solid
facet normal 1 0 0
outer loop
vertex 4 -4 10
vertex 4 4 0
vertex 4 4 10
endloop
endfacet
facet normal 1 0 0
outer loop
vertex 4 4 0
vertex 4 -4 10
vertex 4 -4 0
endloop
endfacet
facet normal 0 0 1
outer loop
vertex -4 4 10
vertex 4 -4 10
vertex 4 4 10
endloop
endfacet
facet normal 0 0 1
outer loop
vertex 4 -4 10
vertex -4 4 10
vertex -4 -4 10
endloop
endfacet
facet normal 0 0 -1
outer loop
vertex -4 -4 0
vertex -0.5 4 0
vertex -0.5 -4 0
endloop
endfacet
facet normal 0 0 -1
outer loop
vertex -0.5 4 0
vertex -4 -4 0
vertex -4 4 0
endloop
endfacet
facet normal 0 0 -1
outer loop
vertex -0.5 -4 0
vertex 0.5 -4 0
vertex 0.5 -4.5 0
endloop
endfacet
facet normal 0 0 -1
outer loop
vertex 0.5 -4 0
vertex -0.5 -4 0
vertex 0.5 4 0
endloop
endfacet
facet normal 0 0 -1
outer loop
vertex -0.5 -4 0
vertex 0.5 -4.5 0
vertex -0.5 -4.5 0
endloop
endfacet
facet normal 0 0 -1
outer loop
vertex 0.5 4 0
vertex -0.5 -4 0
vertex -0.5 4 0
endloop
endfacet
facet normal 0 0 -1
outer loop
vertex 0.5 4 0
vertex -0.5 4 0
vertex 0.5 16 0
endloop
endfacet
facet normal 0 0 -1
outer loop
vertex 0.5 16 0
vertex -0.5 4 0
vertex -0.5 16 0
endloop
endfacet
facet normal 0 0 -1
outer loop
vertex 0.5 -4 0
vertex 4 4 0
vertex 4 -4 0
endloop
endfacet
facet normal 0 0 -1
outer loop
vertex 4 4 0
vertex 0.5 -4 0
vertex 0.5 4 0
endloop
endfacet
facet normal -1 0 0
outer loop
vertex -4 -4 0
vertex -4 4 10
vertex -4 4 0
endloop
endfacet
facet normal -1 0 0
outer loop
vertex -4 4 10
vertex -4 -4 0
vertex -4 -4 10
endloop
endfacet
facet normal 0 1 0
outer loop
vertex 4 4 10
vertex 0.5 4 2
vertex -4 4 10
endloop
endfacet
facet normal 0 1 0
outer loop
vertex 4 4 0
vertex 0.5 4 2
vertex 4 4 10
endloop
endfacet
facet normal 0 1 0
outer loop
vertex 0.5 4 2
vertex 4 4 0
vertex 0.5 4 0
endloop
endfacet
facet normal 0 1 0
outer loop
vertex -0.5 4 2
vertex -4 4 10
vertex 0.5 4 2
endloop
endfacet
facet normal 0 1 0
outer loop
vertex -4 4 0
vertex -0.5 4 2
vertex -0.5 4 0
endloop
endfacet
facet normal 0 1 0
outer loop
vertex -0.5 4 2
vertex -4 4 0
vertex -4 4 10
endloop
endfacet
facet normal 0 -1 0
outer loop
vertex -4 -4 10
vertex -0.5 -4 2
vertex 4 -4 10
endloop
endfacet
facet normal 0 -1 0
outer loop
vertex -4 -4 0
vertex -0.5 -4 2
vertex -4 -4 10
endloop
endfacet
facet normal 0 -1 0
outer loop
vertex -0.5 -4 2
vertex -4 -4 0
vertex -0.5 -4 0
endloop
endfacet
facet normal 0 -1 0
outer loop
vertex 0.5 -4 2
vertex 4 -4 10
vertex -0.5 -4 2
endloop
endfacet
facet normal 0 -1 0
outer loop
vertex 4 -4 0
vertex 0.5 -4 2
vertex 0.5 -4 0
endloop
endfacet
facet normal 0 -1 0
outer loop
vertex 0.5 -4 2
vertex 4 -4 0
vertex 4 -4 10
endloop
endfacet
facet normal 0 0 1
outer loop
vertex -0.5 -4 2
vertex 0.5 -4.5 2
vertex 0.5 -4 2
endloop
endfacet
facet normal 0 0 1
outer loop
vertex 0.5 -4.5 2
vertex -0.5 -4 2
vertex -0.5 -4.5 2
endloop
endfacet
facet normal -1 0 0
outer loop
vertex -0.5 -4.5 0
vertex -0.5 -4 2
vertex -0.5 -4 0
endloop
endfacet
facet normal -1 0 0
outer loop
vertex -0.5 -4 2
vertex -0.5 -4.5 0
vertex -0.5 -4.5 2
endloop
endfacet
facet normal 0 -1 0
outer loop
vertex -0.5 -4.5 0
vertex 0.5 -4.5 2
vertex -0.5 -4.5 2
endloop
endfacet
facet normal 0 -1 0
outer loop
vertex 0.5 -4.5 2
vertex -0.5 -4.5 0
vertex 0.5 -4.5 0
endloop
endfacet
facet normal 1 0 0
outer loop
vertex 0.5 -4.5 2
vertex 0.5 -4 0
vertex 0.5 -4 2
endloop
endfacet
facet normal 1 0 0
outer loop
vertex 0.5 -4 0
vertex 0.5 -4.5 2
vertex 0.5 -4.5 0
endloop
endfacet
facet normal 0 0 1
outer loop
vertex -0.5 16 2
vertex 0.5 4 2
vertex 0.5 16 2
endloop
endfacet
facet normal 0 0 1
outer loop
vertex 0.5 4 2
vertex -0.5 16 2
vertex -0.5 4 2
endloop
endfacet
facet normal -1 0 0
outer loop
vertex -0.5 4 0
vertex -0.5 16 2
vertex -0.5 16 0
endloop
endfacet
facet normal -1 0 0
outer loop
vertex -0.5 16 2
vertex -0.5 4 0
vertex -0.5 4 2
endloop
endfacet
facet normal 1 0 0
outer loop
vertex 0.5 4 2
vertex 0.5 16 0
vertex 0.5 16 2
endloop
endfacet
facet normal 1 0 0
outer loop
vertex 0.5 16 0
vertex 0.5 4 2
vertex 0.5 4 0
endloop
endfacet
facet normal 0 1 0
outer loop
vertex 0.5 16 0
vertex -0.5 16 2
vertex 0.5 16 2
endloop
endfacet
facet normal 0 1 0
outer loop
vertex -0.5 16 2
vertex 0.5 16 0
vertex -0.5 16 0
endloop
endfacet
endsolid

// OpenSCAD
translate([0, 0, 5]) color([0,1,0,0.9]) cube([8, 8, 10], center=true);
translate([-0.25, -4.25, 1]) color([1,0,0]) cube([0.5, 0.5, 2], center=true);
translate([0.25, -4.25, 1]) color([1,0,0]) cube([0.5, 0.5, 2], center=true);
translate([-0.25, -3.75, 1]) color([1,0,0]) cube([0.5, 0.5, 2], center=true);
translate([0.25, -3.75, 1]) color([1,0,0]) cube([0.5, 0.5, 2], center=true);
translate([-0.25, -3.25, 1]) color([1,0,0]) cube([0.5, 0.5, 2], center=true);
translate([0.25, -3.25, 1]) color([1,0,0]) cube([0.5, 0.5, 2], center=true);
translate([-0.25, -2.75, 1]) color([1,0,0]) cube([0.5, 0.5, 2], center=true);
translate([0.25, -2.75, 1]) color([1,0,0]) cube([0.5, 0.5, 2], center=true);
translate([-0.25, -2.25, 1]) color([1,0,0]) cube([0.5, 0.5, 2], center=true);
translate([0.25, -2.25, 1]) color([1,0,0]) cube([0.5, 0.5, 2], center=true);
translate([-0.25, -1.75, 1]) color([1,0,0]) cube([0.5, 0.5, 2], center=true);
translate([0.25, -1.75, 1]) color([1,0,0]) cube([0.5, 0.5, 2], center=true);
translate([-0.25, -1.25, 1]) color([1,0,0]) cube([0.5, 0.5, 2], center=true);
translate([0.25, -1.25, 1]) color([1,0,0]) cube([0.5, 0.5, 2], center=true);
translate([-0.25, -0.75, 1]) color([1,0,0]) cube([0.5, 0.5, 2], center=true);
translate([0.25, -0.75, 1]) color([1,0,0]) cube([0.5, 0.5, 2], center=true);
translate([-0.25, -0.25, 1]) color([1,0,0]) cube([0.5, 0.5, 2], center=true);
translate([0.25, -0.25, 1]) color([1,0,0]) cube([0.5, 0.5, 2], center=true);
translate([-0.25, 0.25, 1]) color([1,0,0]) cube([0.5, 0.5, 2], center=true);
translate([0.25, 0.25, 1]) color([1,0,0]) cube([0.5, 0.5, 2], center=true);
translate([-0.25, 0.75, 1]) color([1,0,0]) cube([0.5, 0.5, 2], center=true);
translate([0.25, 0.75, 1]) color([1,0,0]) cube([0.5, 0.5, 2], center=true);
translate([-0.25, 1.25, 1]) color([1,0,0]) cube([0.5, 0.5, 2], center=true);
translate([0.25, 1.25, 1]) color([1,0,0]) cube([0.5, 0.5, 2], center=true);
translate([-0.25, 1.75, 1]) color([1,0,0]) cube([0.5, 0.5, 2], center=true);
translate([0.25, 1.75, 1]) color([1,0,0]) cube([0.5, 0.5, 2], center=true);
translate([-0.25, 2.25, 1]) color([1,0,0]) cube([0.5, 0.5, 2], center=true);
translate([0.25, 2.25, 1]) color([1,0,0]) cube([0.5, 0.5, 2], center=true);
translate([-0.25, 2.75, 1]) color([1,0,0]) cube([0.5, 0.5, 2], center=true);
translate([0.25, 2.75, 1]) color([1,0,0]) cube([0.5, 0.5, 2], center=true);
translate([-0.25, 3.25, 1]) color([1,0,0]) cube([0.5, 0.5, 2], center=true);
translate([0.25, 3.25, 1]) color([1,0,0]) cube([0.5, 0.5, 2], center=true);
translate([-0.25, 3.75, 1]) color([1,0,0]) cube([0.5, 0.5, 2], center=true);
translate([0.25, 3.75, 1]) color([1,0,0]) cube([0.5, 0.5, 2], center=true);
translate([-0.25, 4.25, 1]) color([1,0,0]) cube([0.5, 0.5, 2], center=true);
translate([0.25, 4.25, 1]) color([1,0,0]) cube([0.5, 0.5, 2], center=true);
translate([-0.25, 4.75, 1]) color([1,0,0]) cube([0.5, 0.5, 2], center=true);
translate([0.25, 4.75, 1]) color([1,0,0]) cube([0.5, 0.5, 2], center=true);
translate([-0.25, 5.25, 1]) color([1,0,0]) cube([0.5, 0.5, 2], center=true);
translate([0.25, 5.25, 1]) color([1,0,0]) cube([0.5, 0.5, 2], center=true);
translate([-0.25, 5.75, 1]) color([1,0,0]) cube([0.5, 0.5, 2], center=true);
translate([0.25, 5.75, 1]) color([1,0,0]) cube([0.5, 0.5, 2], center=true);
translate([-0.25, 6.25, 1]) color([1,0,0]) cube([0.5, 0.5, 2], center=true);
translate([0.25, 6.25, 1]) color([1,0,0]) cube([0.5, 0.5, 2], center=true);
translate([-0.25, 6.75, 1]) color([1,0,0]) cube([0.5, 0.5, 2], center=true);
translate([0.25, 6.75, 1]) color([1,0,0]) cube([0.5, 0.5, 2], center=true);
translate([-0.25, 7.25, 1]) color([1,0,0]) cube([0.5, 0.5, 2], center=true);
translate([0.25, 7.25, 1]) color([1,0,0]) cube([0.5, 0.5, 2], center=true);
translate([-0.25, 7.75, 1]) color([1,0,0]) cube([0.5, 0.5, 2], center=true);
translate([0.25, 7.75, 1]) color([1,0,0]) cube([0.5, 0.5, 2], center=true);
translate([-0.25, 8.25, 1]) color([1,0,0]) cube([0.5, 0.5, 2], center=true);
translate([0.25, 8.25, 1]) color([1,0,0]) cube([0.5, 0.5, 2], center=true);
translate([-0.25, 8.75, 1]) color([1,0,0]) cube([0.5, 0.5, 2], center=true);
translate([0.25, 8.75, 1]) color([1,0,0]) cube([0.5, 0.5, 2], center=true);
translate([-0.25, 9.25, 1]) color([1,0,0]) cube([0.5, 0.5, 2], center=true);
translate([0.25, 9.25, 1]) color([1,0,0]) cube([0.5, 0.5, 2], center=true);
translate([-0.25, 9.75, 1]) color([1,0,0]) cube([0.5, 0.5, 2], center=true);
translate([0.25, 9.75, 1]) color([1,0,0]) cube([0.5, 0.5, 2], center=true);
translate([-0.25, 10.25, 1]) color([1,0,0]) cube([0.5, 0.5, 2], center=true);
translate([0.25, 10.25, 1]) color([1,0,0]) cube([0.5, 0.5, 2], center=true);
translate([-0.25, 10.75, 1]) color([1,0,0]) cube([0.5, 0.5, 2], center=true);
translate([0.25, 10.75, 1]) color([1,0,0]) cube([0.5, 0.5, 2], center=true);
translate([-0.25, 11.25, 1]) color([1,0,0]) cube([0.5, 0.5, 2], center=true);
translate([0.25, 11.25, 1]) color([1,0,0]) cube([0.5, 0.5, 2], center=true);
translate([-0.25, 11.75, 1]) color([1,0,0]) cube([0.5, 0.5, 2], center=true);
translate([0.25, 11.75, 1]) color([1,0,0]) cube([0.5, 0.5, 2], center=true);
translate([-0.25, 12.25, 1]) color([1,0,0]) cube([0.5, 0.5, 2], center=true);
translate([0.25, 12.25, 1]) color([1,0,0]) cube([0.5, 0.5, 2], center=true);
translate([-0.25, 12.75, 1]) color([1,0,0]) cube([0.5, 0.5, 2], center=true);
translate([0.25, 12.75, 1]) color([1,0,0]) cube([0.5, 0.5, 2], center=true);
translate([-0.25, 13.25, 1]) color([1,0,0]) cube([0.5, 0.5, 2], center=true);
translate([0.25, 13.25, 1]) color([1,0,0]) cube([0.5, 0.5, 2], center=true);
translate([-0.25, 13.75, 1]) color([1,0,0]) cube([0.5, 0.5, 2], center=true);
translate([0.25, 13.75, 1]) color([1,0,0]) cube([0.5, 0.5, 2], center=true);
translate([-0.25, 14.25, 1]) color([1,0,0]) cube([0.5, 0.5, 2], center=true);
translate([0.25, 14.25, 1]) color([1,0,0]) cube([0.5, 0.5, 2], center=true);
translate([-0.25, 14.75, 1]) color([1,0,0]) cube([0.5, 0.5, 2], center=true);
translate([0.25, 14.75, 1]) color([1,0,0]) cube([0.5, 0.5, 2], center=true);
translate([-0.25, 15.25, 1]) color([1,0,0]) cube([0.5, 0.5, 2], center=true);
translate([0.25, 15.25, 1]) color([1,0,0]) cube([0.5, 0.5, 2], center=true);
translate([-0.25, 15.75, 1]) color([1,0,0]) cube([0.5, 0.5, 2], center=true);
translate([0.25, 15.75, 1]) color([1,0,0]) cube([0.5, 0.5, 2], center=true);
